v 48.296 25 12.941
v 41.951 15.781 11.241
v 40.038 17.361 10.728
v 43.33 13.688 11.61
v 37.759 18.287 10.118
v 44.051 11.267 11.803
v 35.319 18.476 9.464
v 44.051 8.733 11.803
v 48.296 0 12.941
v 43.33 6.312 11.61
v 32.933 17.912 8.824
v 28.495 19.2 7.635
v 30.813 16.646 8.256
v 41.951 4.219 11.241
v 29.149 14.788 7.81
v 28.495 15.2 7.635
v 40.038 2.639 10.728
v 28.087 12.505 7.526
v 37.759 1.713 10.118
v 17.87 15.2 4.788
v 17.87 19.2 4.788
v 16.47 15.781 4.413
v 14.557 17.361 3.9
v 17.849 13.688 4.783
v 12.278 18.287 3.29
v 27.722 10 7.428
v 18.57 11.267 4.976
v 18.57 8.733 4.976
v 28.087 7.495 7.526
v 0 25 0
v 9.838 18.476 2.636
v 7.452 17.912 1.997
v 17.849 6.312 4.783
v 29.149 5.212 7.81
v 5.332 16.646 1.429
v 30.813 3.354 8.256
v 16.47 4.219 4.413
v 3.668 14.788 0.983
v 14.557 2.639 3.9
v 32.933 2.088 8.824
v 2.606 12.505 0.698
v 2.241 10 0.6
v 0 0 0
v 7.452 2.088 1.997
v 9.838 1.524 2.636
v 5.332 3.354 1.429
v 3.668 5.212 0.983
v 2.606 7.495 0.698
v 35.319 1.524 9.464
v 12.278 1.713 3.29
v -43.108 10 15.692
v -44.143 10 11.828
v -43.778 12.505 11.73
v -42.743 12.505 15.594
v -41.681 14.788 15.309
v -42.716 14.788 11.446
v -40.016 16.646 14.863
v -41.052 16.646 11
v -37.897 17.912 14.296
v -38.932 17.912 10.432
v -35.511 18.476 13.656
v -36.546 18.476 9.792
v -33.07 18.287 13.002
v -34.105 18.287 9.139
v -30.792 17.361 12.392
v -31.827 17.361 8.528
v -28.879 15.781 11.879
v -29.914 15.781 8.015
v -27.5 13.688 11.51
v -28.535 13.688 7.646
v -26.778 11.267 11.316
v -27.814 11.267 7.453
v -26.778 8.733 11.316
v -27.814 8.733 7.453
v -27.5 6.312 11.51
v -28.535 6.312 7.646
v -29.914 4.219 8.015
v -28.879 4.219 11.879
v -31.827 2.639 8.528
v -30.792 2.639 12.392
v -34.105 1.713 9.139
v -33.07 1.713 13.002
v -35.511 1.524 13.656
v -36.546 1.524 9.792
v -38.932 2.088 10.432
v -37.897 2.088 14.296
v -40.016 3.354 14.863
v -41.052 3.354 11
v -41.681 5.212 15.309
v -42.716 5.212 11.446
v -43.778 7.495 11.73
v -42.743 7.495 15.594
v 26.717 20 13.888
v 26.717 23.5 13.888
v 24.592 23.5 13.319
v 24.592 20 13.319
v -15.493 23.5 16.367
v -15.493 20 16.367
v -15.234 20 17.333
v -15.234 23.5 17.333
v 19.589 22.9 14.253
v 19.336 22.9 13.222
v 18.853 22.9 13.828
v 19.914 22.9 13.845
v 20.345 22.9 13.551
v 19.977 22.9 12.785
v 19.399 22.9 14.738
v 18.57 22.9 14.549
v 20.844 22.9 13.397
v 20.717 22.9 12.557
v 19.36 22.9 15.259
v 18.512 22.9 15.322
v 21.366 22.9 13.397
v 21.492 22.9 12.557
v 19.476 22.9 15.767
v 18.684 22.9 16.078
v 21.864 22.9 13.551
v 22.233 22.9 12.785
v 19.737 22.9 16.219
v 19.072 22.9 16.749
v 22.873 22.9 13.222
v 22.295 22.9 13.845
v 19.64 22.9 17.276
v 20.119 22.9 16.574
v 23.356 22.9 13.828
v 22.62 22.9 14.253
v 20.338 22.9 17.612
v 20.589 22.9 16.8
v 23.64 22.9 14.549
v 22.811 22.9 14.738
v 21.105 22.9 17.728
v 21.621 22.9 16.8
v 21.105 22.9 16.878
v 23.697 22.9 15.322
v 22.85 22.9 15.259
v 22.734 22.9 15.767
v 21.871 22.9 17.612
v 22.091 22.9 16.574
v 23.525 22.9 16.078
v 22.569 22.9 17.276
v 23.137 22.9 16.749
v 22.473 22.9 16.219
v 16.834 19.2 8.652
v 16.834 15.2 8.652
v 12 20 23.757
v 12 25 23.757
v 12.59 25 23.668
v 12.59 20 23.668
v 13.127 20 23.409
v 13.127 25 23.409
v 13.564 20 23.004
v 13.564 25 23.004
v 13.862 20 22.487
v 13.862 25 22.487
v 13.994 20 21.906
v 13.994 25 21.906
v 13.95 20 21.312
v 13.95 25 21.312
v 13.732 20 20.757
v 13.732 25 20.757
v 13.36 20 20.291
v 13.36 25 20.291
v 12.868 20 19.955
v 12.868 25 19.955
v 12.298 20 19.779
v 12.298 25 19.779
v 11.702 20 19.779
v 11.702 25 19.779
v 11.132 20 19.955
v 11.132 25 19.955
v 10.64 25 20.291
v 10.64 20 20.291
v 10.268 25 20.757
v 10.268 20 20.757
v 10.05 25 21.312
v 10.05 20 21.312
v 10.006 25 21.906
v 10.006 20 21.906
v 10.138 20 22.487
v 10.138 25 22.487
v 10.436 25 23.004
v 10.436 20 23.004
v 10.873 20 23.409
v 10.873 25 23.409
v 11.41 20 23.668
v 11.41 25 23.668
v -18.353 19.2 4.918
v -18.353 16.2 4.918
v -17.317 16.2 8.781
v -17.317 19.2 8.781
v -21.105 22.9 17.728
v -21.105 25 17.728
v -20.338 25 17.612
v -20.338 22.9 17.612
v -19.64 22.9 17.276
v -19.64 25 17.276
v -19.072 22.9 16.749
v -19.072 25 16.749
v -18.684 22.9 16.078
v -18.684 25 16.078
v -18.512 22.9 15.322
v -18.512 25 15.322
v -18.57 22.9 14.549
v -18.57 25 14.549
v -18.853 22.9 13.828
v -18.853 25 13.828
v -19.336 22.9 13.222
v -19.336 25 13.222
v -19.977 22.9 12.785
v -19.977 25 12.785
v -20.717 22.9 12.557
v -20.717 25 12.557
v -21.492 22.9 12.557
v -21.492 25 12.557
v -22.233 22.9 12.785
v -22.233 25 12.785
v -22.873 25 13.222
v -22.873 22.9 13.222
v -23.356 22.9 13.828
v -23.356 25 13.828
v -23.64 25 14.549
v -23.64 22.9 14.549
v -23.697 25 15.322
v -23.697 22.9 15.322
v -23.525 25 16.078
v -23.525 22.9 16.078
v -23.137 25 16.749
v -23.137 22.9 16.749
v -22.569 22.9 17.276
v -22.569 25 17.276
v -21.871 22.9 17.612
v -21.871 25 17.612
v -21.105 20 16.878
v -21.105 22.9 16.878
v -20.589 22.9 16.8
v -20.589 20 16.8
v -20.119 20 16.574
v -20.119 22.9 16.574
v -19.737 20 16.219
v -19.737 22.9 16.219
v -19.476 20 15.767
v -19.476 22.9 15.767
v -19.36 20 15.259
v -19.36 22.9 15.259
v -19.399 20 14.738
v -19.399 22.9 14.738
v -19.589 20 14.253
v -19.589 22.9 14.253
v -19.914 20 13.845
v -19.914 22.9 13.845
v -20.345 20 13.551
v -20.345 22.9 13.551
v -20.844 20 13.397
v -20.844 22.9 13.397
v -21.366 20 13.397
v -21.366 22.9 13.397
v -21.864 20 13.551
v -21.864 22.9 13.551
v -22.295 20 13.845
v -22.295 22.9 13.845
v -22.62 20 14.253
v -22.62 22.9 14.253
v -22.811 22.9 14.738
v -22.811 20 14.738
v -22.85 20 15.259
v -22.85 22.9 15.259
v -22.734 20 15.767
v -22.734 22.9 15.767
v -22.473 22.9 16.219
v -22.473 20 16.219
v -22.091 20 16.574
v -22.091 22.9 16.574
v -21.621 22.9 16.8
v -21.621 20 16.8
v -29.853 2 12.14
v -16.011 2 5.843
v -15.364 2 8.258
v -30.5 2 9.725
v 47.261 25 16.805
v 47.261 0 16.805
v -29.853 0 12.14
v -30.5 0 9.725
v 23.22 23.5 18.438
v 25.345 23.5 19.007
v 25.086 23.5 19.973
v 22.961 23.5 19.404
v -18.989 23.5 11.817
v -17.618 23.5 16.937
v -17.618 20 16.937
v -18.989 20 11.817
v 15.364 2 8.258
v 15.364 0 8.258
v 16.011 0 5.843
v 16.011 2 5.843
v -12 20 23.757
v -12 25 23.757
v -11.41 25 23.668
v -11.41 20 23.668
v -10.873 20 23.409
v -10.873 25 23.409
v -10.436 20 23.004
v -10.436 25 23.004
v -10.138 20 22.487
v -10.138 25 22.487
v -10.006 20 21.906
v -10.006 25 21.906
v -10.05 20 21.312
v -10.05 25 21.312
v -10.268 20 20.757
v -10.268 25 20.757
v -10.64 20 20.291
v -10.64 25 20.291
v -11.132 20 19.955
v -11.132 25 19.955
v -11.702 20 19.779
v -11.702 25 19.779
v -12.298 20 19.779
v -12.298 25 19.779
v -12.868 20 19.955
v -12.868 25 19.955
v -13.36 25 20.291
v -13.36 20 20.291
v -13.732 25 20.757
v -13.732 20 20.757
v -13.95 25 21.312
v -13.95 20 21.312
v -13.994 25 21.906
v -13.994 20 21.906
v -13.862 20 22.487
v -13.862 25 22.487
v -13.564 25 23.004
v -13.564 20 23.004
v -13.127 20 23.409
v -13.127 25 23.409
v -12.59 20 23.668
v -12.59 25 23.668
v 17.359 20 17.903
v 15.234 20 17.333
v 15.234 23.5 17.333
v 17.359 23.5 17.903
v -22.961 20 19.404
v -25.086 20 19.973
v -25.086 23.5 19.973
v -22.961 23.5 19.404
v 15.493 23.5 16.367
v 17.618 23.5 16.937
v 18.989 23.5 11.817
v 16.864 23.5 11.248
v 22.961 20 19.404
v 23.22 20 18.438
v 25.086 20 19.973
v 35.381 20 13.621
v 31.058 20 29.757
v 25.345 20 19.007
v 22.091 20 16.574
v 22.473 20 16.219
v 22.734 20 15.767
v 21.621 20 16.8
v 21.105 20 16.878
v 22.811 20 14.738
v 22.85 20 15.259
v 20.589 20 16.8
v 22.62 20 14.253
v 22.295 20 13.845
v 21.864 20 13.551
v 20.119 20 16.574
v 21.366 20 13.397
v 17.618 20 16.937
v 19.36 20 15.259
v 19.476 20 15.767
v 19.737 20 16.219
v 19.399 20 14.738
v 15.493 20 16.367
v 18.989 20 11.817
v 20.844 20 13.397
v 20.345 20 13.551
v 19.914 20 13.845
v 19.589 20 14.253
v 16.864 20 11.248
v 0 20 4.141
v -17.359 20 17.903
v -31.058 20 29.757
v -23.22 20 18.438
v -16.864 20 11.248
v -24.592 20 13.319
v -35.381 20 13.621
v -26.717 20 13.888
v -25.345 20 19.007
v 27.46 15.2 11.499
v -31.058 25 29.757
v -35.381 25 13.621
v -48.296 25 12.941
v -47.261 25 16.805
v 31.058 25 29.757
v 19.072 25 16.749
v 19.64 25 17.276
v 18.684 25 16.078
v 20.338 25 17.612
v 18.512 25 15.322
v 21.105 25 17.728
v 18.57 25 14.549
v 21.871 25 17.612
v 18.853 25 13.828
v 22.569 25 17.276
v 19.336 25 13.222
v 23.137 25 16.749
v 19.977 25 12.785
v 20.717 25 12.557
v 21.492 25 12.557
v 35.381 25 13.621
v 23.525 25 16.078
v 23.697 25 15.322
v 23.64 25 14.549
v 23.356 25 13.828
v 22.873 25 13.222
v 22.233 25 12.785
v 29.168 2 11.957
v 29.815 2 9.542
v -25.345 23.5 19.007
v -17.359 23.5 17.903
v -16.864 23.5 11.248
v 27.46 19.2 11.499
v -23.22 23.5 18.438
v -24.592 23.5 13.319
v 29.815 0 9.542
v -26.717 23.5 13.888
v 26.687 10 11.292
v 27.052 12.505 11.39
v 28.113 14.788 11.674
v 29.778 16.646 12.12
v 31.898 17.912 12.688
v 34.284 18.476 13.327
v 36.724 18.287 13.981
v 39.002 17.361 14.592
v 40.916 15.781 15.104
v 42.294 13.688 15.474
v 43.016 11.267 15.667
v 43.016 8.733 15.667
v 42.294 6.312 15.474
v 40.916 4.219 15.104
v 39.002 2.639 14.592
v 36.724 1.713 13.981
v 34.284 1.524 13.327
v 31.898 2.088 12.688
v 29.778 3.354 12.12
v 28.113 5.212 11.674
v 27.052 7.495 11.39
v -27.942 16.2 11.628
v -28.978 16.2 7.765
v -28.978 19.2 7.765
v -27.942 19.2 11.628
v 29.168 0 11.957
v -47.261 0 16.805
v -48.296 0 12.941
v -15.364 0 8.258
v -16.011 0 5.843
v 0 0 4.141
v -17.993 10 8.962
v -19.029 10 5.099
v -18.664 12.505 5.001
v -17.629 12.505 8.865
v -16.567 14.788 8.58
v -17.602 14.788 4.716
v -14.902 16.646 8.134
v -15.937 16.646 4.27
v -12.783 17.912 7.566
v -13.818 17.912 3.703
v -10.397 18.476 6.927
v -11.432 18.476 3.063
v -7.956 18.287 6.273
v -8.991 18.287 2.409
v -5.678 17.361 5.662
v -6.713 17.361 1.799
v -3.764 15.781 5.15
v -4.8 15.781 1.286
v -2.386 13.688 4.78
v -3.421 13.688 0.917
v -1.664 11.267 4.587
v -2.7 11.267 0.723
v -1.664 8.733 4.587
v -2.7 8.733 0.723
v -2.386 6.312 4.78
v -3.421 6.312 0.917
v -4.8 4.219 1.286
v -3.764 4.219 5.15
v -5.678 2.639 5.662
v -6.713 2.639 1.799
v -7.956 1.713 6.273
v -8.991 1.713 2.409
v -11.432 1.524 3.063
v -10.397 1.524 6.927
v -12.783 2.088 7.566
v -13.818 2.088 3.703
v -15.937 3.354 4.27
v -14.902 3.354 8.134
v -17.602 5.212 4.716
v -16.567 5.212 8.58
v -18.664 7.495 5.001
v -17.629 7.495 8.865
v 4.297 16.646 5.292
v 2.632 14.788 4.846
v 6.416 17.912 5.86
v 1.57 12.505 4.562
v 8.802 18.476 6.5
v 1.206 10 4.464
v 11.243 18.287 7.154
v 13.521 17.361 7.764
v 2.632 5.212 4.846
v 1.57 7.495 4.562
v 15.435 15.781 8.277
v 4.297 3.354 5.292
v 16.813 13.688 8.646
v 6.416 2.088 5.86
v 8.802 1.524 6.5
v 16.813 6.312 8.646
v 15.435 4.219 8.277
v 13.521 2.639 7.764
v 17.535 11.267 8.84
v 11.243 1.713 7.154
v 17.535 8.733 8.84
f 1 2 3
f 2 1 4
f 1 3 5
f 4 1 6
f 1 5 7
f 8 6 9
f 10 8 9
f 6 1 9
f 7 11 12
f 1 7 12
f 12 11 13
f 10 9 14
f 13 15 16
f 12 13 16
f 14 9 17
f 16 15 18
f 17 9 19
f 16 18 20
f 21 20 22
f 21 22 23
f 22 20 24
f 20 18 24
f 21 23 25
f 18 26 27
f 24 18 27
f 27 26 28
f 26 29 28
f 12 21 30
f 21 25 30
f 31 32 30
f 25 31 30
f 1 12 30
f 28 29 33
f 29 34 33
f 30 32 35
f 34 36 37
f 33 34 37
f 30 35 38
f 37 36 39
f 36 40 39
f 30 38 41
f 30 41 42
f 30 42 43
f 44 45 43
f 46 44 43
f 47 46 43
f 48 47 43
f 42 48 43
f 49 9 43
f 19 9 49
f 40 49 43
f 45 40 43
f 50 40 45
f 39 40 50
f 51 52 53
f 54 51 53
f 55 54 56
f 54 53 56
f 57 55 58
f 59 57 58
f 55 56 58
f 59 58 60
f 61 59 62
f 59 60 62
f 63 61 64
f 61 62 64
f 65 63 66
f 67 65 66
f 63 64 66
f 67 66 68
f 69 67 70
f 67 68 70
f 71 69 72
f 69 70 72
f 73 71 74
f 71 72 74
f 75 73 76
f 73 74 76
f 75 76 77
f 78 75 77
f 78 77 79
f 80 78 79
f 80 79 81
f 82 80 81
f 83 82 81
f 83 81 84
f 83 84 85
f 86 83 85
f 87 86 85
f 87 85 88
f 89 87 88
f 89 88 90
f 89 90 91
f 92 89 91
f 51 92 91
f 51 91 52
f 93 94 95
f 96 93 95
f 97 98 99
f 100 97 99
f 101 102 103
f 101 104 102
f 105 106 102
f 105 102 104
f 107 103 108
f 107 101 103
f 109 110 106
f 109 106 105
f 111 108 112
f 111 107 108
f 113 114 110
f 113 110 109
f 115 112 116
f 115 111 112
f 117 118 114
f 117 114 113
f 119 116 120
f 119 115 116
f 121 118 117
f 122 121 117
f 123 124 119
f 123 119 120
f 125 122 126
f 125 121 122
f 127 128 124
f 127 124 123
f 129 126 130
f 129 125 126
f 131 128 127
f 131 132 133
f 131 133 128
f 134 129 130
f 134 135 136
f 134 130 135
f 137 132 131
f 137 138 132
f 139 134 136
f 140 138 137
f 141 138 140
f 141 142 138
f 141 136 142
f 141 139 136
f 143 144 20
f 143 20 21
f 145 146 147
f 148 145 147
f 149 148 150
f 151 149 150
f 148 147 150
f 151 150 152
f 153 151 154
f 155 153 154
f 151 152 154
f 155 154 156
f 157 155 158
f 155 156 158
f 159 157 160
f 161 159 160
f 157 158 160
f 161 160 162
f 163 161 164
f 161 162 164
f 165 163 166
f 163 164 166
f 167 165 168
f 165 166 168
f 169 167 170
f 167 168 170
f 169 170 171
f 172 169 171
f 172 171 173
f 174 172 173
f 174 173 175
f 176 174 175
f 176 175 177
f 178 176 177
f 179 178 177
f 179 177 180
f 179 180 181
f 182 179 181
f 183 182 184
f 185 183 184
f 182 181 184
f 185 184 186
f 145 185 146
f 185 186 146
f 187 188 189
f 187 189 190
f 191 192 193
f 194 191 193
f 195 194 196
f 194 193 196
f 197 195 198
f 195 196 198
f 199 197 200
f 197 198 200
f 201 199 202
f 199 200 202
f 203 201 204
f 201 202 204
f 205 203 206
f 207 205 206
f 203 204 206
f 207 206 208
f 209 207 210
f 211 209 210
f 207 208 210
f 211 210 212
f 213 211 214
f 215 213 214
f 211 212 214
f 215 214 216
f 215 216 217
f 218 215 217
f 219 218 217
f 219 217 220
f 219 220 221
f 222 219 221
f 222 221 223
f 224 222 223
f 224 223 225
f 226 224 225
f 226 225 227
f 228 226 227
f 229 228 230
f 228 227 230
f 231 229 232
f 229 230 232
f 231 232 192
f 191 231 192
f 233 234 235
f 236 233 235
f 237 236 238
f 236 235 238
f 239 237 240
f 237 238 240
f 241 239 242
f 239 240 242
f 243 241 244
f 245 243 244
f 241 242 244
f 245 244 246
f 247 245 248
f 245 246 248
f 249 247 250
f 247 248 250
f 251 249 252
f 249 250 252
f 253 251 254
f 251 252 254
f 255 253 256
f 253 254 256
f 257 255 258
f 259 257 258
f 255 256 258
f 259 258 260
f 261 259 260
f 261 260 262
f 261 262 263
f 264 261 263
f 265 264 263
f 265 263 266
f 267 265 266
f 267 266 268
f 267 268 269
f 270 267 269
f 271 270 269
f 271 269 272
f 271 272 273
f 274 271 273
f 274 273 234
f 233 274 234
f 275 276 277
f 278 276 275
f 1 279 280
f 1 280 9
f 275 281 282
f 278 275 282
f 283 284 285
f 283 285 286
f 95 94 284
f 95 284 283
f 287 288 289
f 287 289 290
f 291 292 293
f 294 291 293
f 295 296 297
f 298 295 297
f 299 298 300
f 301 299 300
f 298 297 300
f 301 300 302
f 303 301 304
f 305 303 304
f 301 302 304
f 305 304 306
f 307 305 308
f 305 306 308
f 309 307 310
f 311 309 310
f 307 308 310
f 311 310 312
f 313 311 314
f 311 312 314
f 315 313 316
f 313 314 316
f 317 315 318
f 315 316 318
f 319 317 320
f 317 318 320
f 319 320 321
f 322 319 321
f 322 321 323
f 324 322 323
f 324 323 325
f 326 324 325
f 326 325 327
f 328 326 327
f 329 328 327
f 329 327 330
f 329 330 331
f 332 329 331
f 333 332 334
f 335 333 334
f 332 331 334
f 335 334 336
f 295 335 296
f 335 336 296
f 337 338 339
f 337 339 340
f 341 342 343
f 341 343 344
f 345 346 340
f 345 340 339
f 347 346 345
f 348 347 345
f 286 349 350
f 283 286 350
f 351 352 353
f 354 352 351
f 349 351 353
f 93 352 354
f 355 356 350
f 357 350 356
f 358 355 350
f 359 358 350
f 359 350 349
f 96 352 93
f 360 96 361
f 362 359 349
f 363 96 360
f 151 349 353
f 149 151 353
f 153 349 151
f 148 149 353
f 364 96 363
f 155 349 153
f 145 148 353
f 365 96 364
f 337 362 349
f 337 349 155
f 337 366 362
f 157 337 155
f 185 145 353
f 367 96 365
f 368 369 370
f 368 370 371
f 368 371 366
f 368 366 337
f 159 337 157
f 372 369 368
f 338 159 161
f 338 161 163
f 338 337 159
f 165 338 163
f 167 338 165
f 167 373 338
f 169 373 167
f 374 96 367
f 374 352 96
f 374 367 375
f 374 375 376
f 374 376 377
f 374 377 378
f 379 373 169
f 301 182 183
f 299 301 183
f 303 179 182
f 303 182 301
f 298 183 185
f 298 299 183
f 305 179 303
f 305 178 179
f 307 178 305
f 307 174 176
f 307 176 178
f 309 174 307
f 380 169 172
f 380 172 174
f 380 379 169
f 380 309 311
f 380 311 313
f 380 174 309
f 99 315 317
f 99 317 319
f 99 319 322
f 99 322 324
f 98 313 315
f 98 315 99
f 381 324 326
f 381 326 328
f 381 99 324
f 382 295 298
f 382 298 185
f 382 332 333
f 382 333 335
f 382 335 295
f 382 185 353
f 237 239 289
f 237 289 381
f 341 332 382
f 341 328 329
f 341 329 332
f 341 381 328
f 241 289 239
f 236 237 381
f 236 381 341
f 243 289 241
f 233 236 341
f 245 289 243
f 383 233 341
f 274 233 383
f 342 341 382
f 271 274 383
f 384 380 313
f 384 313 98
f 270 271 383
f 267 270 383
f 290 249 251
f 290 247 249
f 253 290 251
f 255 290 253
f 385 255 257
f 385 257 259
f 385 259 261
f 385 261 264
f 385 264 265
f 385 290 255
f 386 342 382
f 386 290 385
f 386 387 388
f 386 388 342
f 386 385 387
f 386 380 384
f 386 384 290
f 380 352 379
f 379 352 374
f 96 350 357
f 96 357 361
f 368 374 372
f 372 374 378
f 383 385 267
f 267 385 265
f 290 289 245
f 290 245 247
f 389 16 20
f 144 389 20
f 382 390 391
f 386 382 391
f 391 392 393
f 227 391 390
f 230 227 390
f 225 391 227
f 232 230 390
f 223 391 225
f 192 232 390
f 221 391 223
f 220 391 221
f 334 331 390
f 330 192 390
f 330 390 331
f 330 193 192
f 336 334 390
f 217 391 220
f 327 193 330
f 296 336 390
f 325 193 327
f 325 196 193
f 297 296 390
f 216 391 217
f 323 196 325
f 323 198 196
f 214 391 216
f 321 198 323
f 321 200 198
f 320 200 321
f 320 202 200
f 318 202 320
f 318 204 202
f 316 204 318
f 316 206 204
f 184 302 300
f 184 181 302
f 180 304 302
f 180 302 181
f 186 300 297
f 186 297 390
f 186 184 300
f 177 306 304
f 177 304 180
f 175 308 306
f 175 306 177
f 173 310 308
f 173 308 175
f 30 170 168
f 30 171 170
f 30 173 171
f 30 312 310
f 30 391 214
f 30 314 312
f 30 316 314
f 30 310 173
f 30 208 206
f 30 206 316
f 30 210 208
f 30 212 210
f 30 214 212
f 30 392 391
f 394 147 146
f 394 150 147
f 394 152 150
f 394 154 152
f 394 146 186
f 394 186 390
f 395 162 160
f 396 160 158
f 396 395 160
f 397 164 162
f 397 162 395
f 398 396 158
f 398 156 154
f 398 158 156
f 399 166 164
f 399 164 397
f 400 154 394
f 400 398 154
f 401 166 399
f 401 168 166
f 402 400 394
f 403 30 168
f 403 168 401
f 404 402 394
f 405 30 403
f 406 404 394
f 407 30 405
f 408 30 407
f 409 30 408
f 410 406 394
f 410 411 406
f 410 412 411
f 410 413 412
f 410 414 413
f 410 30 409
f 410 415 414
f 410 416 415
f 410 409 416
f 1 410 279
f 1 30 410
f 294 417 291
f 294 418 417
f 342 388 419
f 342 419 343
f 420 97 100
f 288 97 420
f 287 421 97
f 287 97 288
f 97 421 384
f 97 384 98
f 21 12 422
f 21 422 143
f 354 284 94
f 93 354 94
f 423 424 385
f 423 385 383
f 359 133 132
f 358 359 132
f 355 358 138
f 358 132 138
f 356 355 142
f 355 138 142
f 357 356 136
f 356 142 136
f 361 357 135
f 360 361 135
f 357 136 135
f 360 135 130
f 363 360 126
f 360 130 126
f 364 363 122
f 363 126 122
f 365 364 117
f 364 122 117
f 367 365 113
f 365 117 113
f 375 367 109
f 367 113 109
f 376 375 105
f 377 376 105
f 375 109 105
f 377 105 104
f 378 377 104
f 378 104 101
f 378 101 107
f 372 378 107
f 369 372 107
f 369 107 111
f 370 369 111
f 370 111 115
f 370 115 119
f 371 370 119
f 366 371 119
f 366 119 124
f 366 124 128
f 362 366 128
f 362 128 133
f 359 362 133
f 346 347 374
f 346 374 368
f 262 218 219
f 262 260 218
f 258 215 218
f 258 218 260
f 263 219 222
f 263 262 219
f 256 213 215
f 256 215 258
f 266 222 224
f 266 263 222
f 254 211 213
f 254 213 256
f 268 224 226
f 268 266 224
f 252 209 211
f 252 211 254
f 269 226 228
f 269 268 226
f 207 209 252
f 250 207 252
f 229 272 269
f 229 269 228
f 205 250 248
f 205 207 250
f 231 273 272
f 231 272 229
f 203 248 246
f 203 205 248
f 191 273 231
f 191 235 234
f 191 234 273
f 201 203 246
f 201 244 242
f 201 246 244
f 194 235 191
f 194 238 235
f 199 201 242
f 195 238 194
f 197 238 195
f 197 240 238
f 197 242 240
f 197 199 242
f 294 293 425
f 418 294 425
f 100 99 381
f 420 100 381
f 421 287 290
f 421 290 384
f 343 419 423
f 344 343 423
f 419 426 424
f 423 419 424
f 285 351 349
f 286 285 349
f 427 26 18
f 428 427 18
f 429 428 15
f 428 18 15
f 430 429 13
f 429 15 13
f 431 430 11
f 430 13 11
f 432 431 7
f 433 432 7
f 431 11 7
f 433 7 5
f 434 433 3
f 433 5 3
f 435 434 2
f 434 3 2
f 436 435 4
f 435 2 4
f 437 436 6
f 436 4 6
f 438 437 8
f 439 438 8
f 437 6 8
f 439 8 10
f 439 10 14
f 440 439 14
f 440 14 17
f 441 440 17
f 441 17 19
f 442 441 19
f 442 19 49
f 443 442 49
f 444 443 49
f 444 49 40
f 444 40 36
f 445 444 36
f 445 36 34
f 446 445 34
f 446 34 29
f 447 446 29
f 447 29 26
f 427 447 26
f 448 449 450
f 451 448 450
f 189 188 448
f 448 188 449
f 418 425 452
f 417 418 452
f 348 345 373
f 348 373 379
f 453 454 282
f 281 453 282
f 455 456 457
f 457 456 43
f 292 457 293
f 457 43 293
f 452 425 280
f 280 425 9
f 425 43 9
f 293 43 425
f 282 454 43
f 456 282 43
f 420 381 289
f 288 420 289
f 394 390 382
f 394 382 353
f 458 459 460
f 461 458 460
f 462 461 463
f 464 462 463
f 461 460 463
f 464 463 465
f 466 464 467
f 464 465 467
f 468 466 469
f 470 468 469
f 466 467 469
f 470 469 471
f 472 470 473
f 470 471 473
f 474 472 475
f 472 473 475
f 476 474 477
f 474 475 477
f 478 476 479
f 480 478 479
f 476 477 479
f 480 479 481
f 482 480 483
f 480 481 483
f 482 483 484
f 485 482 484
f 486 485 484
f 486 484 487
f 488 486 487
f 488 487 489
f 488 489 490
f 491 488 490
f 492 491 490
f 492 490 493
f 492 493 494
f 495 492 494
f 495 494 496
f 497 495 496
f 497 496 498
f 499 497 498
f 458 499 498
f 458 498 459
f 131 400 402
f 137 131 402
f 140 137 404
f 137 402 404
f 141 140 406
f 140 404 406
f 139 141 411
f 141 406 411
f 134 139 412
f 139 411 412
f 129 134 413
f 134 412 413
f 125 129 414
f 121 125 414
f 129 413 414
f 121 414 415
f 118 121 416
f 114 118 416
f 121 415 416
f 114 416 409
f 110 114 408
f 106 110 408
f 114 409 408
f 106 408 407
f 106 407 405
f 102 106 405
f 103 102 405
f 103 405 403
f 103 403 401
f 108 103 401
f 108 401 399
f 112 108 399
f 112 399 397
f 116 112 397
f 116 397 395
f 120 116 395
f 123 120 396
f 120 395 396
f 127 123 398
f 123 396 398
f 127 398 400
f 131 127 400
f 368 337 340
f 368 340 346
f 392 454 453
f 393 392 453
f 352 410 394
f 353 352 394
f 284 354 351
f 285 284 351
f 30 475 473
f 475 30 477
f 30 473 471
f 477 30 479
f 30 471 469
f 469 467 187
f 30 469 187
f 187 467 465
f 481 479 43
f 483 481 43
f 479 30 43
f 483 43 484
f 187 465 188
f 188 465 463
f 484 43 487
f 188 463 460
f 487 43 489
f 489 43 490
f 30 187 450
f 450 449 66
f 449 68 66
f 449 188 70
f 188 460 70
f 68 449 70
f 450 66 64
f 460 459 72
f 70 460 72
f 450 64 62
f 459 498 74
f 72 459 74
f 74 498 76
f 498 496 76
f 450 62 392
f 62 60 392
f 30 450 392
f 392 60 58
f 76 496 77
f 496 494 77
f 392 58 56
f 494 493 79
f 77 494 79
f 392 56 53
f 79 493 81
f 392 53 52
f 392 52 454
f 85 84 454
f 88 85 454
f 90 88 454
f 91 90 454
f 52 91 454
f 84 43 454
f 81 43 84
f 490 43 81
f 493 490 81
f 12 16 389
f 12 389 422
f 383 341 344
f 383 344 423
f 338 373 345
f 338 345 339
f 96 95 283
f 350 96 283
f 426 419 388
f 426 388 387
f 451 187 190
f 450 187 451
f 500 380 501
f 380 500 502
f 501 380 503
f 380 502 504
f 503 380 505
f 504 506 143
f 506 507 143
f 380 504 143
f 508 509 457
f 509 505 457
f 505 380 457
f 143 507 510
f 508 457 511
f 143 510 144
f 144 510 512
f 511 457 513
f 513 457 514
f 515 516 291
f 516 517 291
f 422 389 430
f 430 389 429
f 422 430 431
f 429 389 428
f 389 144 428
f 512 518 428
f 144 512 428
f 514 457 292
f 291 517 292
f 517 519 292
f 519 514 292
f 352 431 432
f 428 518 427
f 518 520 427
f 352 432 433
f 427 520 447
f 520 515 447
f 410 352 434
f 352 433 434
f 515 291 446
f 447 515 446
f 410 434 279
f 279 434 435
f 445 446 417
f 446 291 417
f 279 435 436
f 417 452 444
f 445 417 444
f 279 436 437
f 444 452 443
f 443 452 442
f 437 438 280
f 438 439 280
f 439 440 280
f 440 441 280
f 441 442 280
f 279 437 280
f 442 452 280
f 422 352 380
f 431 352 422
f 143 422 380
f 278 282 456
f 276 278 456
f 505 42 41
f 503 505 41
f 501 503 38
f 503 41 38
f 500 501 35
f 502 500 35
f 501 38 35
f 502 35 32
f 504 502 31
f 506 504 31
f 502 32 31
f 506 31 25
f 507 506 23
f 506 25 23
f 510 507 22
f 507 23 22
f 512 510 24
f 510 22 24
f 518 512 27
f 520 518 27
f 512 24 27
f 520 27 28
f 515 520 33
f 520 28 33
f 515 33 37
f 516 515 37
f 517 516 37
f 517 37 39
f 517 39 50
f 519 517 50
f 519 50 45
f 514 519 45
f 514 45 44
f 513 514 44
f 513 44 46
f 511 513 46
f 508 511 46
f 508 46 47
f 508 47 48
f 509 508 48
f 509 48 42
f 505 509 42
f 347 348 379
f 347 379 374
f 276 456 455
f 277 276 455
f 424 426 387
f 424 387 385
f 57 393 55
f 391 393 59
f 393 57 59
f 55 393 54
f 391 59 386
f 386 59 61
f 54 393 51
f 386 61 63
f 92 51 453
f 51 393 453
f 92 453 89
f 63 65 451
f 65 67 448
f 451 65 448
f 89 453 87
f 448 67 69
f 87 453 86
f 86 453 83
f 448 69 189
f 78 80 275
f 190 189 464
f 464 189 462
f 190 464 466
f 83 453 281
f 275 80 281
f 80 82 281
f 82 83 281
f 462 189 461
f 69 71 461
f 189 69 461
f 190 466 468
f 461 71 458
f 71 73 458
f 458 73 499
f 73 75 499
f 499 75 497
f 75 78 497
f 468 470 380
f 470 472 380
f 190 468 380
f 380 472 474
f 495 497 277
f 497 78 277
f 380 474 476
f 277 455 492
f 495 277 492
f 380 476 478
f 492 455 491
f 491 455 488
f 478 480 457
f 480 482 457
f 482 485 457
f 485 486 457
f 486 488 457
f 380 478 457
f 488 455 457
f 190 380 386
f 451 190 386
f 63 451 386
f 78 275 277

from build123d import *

# Parameters (mm, degrees)
BOSS_EXTRUDE1_DEPTH = 25
SKETCH2_R           = 2
BOSS_EXTRUDE2_DEPTH = 5
SKETCH3_R           = 1.75
CUT_EXTRUDE1_DEPTH  = 5
SKETCH4_R           = 2.6
CUT_EXTRUDE2_DEPTH  = 2.1
BOSS_EXTRUDE4_DEPTH = 1.5
SKETCH6_R           = 8.5
SKETCH6_W           = 11
SKETCH6_H           = 3
CUT_EXTRUDE3_DEPTH  = 62.991888409
SKETCH7_R           = 8.5
SKETCH7_W           = 11
SKETCH7_H           = 4
CUT_EXTRUDE4_DEPTH  = 62.991888409
CUT_EXTRUDE6_DEPTH  = 2
CUT_EXTRUDE7_DEPTH  = 3.5


with BuildPart() as part:
    # Sketch1 → Boss-Extrude1 (new body)
    with BuildSketch(Plane(origin=(0, 0, 0), x_dir=(1, 0, 0), z_dir=(0, 1, 0))):
        Polygon((0, 0), (-48.296291314, -12.940952255), (-47.261015134, -16.80465556), (0, -4.141104722), (47.261015134, -16.80465556), (48.296291314, -12.940952255), align=None)
    extrude(amount=BOSS_EXTRUDE1_DEPTH)

    # Sketch2 → Boss-Extrude2 (add)
    with BuildSketch(Plane(origin=(0, 25, 0), x_dir=(1, 0, 0), z_dir=(0, 1, 0))):
        Polygon((18.842355233, -29.75672149), (-18.842355233, -29.75672149), (-31.057618335, -29.75672149), (-35.381056589, -13.621430262), (0, -4.141104722), (35.381056589, -13.621430262), (31.057618335, -29.75672149), align=None)
        with Locations(Location((-12, -21.75672149, 0), (0, 0, 270))):
            Circle(SKETCH2_R, mode=Mode.SUBTRACT)
        with Locations(Location((12, -21.75672149, 0), (0, 0, 270))):
            Circle(SKETCH2_R, mode=Mode.SUBTRACT)
    extrude(amount=-BOSS_EXTRUDE2_DEPTH)

    # Sketch3 → Cut-Extrude1 (cut)
    with BuildSketch(Plane(origin=(0, 25, 0), x_dir=(1, 0, 0), z_dir=(0, 1, 0))):
        Polygon((24.5917878, -13.318644854), (23.220046861, -18.438051734), (25.345083679, -19.007453633), (26.716824618, -13.888046753), align=None)
        with Locations(Location((21.104732435, -15.127773063, 0), (0, 0, 270))):
            Circle(SKETCH3_R)
        Polygon((18.989418008, -11.817494393), (17.617677069, -16.936901272), (15.492640251, -16.367499373), (16.86438119, -11.248092493), align=None)
        Polygon((-15.492640251, -16.367499373), (-17.617677069, -16.936901272), (-18.989418008, -11.817494393), (-16.86438119, -11.248092493), align=None)
        with Locations(Location((-21.104732435, -15.127773063, 0), (0, 0, 270))):
            Circle(SKETCH3_R)
        Polygon((-25.345083679, -19.007453633), (-26.716824618, -13.888046753), (-24.5917878, -13.318644854), (-23.220046861, -18.438051734), align=None)
    extrude(amount=-CUT_EXTRUDE1_DEPTH, mode=Mode.SUBTRACT)

    # Sketch4 → Cut-Extrude2 (cut)
    with BuildSketch(Plane(origin=(0, 25, 0), x_dir=(1, 0, 0), z_dir=(0, 1, 0))):
        with Locations(Location((-21.104732435, -15.127773063, 0), (0, 0, 270))):
            Circle(SKETCH4_R)
        with Locations(Location((21.104732435, -15.127773063, 0), (0, 0, 270))):
            Circle(SKETCH4_R)
    extrude(amount=-CUT_EXTRUDE2_DEPTH, mode=Mode.SUBTRACT)

    # Sketch5 → Boss-Extrude4 (add)
    with BuildSketch(Plane(origin=(0, 25, 0), x_dir=(1, 0, 0), z_dir=(0, 1, 0))):
        Polygon((-26.716824618, -13.888046753), (-25.345083679, -19.007453633), (-23.220046861, -18.438051734), (-24.5917878, -13.318644854), align=None)
        Polygon((-17.617677069, -16.936901272), (-15.492640251, -16.367499373), (-16.86438119, -11.248092493), (-18.989418008, -11.817494393), align=None)
        Polygon((18.989418008, -11.817494393), (17.617677069, -16.936901272), (15.492640251, -16.367499373), (16.86438119, -11.248092493), align=None)
        Polygon((24.5917878, -13.318644854), (26.716824618, -13.888046753), (25.345083679, -19.007453633), (23.220046861, -18.438051734), align=None)
    extrude(amount=-BOSS_EXTRUDE4_DEPTH)

    # Sketch6 → Cut-Extrude3 (cut, through all)
    with BuildSketch(Plane(origin=(0, 0, 0), x_dir=(-0.9659258262890691, 0, 0.2588190451025181), z_dir=(-0.2588190451025181, 0, -0.9659258262890691))):
        with Locations((37.2, 10)):
            Circle(SKETCH6_R)
        with Locations((11.2, 10)):
            Circle(SKETCH6_R)
        with Locations((24.5, 17.7)):
            Rectangle(SKETCH6_W, SKETCH6_H)
    extrude(amount=-CUT_EXTRUDE3_DEPTH, mode=Mode.SUBTRACT)

    # Sketch7 → Cut-Extrude4 (cut, through all)
    with BuildSketch(Plane(origin=(0, 0, 0), x_dir=(-0.9659258262890691, 0, -0.2588190451025176), z_dir=(0.25881904510251763, 0, -0.9659258262890692))):
        with Locations((-10.82, 10)):
            Circle(SKETCH7_R)
        with Locations((-37.2, 10)):
            Circle(SKETCH7_R)
        with Locations((-24, 17.2)):
            Rectangle(SKETCH7_W, SKETCH7_H)
    extrude(amount=-CUT_EXTRUDE4_DEPTH, mode=Mode.SUBTRACT)

    # Sketch8 → Cut-Extrude6 (cut)
    with BuildSketch(Plane(origin=(0, 0, 0), x_dir=(-1, 0, 0), z_dir=(0, -1, 0))):
        Polygon((-29.167865413, -11.956610704), (-15.363800523, -8.257822665), (-16.010848136, -5.843008099), (-29.814913026, -9.541796138), align=None)
        Polygon((15.363800523, -8.257822665), (29.852687918, -12.140108341), (30.499735531, -9.725293775), (16.010848136, -5.843008099), align=None)
    extrude(amount=-CUT_EXTRUDE6_DEPTH, mode=Mode.SUBTRACT)

    # Sketch9 → Cut-Extrude7 (cut)
    with BuildSketch(Plane(origin=(0, 20, 0), x_dir=(-1, 0, 0), z_dir=(0, -1, 0))):
        Polygon((-25.086264634, -19.973379459), (-22.961227816, -19.40397756), (-23.220046861, -18.438051734), (-25.345083679, -19.007453633), align=None)
        Polygon((-15.492640251, -16.367499373), (-15.233821206, -17.333425199), (-17.358858024, -17.902827098), (-17.617677069, -16.936901272), align=None)
        Polygon((15.233821206, -17.333425199), (17.358858024, -17.902827098), (17.617677069, -16.936901272), (15.492640251, -16.367499373), align=None)
        Polygon((25.345083679, -19.007453633), (25.086264634, -19.973379459), (22.961227816, -19.40397756), (23.220046861, -18.438051734), align=None)
    extrude(amount=-CUT_EXTRUDE7_DEPTH, mode=Mode.SUBTRACT)


solid = part.part
